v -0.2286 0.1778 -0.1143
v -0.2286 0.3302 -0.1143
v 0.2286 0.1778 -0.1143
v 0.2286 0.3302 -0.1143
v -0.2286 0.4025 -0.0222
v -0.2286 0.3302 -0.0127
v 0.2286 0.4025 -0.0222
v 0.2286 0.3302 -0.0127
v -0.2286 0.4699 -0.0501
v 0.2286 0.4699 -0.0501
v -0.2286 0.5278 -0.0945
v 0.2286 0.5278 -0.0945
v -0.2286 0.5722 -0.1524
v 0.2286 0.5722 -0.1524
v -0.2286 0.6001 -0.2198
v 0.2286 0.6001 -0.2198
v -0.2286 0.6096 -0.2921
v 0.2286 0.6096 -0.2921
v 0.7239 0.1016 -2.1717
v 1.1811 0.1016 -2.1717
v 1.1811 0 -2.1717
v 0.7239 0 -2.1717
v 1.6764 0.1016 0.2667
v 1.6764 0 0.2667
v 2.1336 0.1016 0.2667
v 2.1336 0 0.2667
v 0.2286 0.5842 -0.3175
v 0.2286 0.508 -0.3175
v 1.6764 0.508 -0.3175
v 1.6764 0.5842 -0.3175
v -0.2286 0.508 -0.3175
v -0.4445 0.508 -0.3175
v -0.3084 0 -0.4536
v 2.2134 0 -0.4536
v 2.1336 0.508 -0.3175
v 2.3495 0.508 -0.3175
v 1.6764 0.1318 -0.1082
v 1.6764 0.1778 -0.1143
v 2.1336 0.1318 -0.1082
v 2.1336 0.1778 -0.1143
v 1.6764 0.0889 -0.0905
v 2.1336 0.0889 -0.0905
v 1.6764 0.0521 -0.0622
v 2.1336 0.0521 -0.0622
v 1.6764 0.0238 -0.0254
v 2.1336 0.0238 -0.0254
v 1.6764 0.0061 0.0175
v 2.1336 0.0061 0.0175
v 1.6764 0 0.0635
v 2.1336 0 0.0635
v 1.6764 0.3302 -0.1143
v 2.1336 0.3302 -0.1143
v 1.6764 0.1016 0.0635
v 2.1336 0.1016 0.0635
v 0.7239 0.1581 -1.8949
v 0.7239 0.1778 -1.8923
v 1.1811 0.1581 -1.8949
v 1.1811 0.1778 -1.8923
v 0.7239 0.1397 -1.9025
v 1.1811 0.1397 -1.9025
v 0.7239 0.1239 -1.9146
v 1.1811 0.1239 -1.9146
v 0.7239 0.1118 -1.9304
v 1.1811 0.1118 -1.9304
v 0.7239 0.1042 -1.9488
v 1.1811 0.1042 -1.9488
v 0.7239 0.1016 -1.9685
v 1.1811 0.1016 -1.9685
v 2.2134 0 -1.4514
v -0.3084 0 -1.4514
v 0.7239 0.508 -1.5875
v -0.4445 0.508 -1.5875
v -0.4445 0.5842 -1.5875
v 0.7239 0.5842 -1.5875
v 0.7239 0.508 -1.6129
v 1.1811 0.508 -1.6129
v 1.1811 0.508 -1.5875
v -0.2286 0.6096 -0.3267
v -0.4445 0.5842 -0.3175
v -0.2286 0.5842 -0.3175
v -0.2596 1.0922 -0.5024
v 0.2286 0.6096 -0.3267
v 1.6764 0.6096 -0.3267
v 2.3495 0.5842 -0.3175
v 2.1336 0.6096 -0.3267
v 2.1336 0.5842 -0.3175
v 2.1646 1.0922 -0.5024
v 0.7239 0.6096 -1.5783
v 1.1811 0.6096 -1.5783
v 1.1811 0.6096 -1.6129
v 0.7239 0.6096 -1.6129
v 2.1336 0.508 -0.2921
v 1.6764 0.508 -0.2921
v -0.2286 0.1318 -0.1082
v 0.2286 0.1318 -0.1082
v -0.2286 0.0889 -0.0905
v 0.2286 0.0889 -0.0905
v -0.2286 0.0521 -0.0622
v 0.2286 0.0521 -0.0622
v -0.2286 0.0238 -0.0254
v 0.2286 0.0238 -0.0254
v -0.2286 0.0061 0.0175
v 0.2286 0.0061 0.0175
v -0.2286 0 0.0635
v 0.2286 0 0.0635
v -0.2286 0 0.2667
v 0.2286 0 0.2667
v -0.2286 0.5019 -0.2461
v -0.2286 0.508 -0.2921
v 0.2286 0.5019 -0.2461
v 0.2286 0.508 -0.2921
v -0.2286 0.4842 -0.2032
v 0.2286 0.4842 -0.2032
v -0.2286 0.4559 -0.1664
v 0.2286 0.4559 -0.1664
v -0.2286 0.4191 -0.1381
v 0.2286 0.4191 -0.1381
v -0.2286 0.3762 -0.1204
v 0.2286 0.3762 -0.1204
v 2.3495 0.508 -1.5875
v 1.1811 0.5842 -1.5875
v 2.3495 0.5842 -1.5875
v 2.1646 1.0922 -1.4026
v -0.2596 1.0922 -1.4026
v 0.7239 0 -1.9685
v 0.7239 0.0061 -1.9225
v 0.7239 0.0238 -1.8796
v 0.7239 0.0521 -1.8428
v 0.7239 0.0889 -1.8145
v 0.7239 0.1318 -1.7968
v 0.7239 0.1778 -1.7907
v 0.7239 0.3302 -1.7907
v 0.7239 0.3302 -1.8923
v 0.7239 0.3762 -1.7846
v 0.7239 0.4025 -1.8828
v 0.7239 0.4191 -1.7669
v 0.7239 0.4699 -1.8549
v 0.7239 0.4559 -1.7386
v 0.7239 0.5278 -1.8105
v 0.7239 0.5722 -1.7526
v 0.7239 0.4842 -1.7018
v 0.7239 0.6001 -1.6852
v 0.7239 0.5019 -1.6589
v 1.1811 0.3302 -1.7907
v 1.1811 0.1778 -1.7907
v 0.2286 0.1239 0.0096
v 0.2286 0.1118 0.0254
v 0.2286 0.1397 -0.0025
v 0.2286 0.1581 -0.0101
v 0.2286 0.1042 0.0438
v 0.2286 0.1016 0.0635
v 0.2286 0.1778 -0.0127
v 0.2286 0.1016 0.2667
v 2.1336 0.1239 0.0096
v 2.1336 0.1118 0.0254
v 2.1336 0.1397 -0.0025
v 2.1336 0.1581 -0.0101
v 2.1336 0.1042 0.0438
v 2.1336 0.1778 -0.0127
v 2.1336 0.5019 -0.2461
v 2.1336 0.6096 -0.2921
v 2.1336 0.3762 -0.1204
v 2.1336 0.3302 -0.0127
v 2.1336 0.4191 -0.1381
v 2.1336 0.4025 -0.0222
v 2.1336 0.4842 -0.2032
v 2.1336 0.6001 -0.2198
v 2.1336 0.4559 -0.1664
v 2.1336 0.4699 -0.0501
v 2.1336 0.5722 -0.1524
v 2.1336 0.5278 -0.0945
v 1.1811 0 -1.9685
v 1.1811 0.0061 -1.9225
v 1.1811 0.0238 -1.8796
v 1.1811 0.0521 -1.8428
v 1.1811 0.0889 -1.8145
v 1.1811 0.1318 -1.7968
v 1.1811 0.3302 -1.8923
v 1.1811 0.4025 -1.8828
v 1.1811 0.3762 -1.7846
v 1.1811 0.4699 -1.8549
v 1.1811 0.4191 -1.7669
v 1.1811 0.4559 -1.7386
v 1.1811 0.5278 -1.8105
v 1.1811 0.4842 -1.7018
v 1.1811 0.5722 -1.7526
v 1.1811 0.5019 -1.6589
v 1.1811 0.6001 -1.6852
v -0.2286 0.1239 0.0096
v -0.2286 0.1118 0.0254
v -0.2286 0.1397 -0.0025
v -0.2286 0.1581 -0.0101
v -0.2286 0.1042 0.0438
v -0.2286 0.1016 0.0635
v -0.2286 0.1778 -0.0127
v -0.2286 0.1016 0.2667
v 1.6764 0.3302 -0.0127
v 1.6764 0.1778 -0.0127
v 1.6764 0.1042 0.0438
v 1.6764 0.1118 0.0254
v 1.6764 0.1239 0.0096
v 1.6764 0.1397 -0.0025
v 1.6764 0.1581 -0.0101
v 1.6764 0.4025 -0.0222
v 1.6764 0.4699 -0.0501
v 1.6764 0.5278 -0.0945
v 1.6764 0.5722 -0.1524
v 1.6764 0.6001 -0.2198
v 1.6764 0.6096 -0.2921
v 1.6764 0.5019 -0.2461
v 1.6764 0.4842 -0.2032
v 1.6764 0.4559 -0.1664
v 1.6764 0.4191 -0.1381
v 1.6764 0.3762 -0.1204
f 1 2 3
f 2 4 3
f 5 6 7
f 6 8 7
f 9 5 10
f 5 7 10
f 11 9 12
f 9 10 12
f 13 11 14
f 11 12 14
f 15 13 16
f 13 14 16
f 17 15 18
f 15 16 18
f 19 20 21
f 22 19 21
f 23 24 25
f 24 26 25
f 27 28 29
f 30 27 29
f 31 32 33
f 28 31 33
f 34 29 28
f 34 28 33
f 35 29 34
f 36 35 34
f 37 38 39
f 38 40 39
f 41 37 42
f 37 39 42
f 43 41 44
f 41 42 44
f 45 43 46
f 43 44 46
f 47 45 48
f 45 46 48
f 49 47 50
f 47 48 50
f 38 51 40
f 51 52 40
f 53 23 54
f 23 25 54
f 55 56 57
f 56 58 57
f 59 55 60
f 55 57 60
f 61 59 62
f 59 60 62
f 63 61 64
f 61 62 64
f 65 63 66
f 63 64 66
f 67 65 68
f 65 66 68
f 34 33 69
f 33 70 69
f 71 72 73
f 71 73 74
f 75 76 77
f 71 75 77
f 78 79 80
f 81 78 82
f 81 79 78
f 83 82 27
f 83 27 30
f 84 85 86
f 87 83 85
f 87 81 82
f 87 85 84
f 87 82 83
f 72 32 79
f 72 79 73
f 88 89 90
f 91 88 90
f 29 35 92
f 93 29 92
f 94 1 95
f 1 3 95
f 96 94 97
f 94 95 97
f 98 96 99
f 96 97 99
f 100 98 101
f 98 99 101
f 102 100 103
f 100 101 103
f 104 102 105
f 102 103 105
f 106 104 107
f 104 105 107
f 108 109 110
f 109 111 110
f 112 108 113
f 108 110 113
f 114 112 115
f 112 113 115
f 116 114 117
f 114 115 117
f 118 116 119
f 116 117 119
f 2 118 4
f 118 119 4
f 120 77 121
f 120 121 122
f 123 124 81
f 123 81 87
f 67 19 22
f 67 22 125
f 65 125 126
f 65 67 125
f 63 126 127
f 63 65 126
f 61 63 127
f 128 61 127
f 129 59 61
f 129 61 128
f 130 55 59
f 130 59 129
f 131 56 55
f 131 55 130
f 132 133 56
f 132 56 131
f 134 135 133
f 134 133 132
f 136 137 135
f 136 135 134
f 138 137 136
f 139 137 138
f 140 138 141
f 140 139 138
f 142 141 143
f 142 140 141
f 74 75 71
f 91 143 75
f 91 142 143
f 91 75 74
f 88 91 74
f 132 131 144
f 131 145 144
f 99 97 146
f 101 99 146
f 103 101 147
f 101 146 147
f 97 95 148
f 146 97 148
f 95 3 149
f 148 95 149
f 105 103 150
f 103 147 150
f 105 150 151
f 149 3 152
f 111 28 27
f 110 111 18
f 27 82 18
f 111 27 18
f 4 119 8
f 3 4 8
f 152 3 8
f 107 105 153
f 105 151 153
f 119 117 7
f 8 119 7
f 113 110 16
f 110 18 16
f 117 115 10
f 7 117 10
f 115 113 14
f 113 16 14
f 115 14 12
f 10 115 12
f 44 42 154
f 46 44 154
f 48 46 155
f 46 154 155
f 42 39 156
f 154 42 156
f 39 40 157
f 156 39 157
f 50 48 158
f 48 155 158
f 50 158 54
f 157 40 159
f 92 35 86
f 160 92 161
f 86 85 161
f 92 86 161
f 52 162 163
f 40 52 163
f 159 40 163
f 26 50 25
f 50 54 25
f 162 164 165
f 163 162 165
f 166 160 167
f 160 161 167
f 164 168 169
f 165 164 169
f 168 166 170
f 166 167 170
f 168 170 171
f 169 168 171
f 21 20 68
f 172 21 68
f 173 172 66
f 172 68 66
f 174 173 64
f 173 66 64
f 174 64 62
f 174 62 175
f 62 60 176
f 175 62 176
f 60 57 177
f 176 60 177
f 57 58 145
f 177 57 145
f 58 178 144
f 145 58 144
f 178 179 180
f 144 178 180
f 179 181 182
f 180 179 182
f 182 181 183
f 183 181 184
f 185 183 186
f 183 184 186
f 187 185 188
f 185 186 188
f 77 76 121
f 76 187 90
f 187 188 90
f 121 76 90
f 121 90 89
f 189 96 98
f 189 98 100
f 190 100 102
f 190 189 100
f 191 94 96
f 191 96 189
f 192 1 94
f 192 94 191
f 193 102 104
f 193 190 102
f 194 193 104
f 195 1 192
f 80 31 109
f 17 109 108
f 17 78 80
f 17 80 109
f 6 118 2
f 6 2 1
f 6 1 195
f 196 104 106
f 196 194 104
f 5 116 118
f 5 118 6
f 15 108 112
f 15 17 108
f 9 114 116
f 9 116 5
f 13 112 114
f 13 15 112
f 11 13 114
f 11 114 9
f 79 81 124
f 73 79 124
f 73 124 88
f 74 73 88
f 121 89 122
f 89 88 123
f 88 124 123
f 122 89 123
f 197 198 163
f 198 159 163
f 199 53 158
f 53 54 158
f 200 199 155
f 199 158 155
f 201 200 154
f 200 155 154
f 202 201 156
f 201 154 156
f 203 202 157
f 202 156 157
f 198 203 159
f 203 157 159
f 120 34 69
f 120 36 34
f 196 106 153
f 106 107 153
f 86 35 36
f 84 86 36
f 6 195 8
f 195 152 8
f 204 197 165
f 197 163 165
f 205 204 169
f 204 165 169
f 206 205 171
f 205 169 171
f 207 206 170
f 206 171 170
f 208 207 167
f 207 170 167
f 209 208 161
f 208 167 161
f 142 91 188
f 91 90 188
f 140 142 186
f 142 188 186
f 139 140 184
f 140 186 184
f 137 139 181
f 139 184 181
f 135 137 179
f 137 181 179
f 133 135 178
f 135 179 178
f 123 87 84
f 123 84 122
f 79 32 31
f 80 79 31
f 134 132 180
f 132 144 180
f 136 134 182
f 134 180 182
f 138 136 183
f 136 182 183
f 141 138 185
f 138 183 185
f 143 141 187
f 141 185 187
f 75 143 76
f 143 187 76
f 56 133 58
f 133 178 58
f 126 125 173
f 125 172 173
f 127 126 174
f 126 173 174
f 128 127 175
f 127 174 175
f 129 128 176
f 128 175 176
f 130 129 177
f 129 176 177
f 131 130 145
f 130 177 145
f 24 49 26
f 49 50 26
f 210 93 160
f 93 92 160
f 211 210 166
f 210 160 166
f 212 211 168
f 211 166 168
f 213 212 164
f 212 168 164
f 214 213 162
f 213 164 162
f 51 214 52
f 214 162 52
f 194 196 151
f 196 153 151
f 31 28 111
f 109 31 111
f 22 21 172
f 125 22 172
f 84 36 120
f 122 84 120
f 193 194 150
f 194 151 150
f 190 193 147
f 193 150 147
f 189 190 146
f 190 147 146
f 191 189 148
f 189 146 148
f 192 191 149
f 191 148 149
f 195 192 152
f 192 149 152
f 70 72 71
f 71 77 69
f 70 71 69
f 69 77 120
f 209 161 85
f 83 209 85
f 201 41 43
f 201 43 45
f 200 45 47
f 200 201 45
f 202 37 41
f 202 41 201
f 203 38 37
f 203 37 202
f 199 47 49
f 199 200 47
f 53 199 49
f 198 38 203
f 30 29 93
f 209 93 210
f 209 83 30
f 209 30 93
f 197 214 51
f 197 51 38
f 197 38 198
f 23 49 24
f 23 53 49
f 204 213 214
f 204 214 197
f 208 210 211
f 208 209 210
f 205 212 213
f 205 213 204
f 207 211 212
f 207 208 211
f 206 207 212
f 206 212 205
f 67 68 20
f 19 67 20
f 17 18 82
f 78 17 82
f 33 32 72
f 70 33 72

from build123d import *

# Parameters (mm, degrees)
SKETCH2_W                = 2.794
SKETCH2_H                = 1.27
BASE_EXTRUDE_DEPTH       = 1.0922
CHAMFER1_SIZE2           = 0.184896879
CHAMFER1_SIZE            = 0.508
CHAMFER2_SIZE2           = 0.508
CHAMFER2_SIZE            = 0.13611819
CHAMFER2_EDGE_2_SIZE2    = 0.508
CHAMFER2_EDGE_2_SIZE     = 0.13611819
CHAMFER2_EDGE_3_SIZE2    = 0.508
CHAMFER2_EDGE_3_SIZE     = 0.13611819
CHAMFER2_EDGE_4_SIZE2    = 0.508
CHAMFER2_EDGE_4_SIZE     = 0.13611819
BOSS_EXTRUDE_THIN2_DEPTH = 0.2286
LPATTERN1_COUNT          = 2
LPATTERN1_PITCH          = 1.905
BOSS_EXTRUDE_THIN3_DEPTH = 0.2286


with BuildPart() as part:
    # Sketch2 → Base-Extrude (new body)
    with BuildSketch(Plane(origin=(0, 0, 0), x_dir=(1, 0, 0), z_dir=(0, 1, 0))):
        with Locations((0.9525, 0.9525)):
            Rectangle(SKETCH2_W, SKETCH2_H)
    extrude(amount=BASE_EXTRUDE_DEPTH)

    # Chamfer1
    chamfer1_edges = [part.edges().sort_by_distance(p)[0] for p in [
        (2.3495, 1.0922, -0.9525),
        (0.9525, 1.0922, -1.5875),
        (-0.4445, 1.0922, -0.9525),
        (0.9525, 1.0922, -0.3175),
    ]]
    chamfer(chamfer1_edges, length=CHAMFER1_SIZE, length2=CHAMFER1_SIZE2)

    # Chamfer2
    chamfer2_edges = [part.edges().sort_by_distance(p)[0] for p in [
        (0.9525, 0, -1.5875),
    ]]
    chamfer(chamfer2_edges, length=CHAMFER2_SIZE, length2=CHAMFER2_SIZE2)

    # Chamfer2 edge 2
    chamfer2_edge_2_edges = [part.edges().sort_by_distance(p)[0] for p in [
        (2.3495, 0, -0.9525),
    ]]
    chamfer(chamfer2_edge_2_edges, length=CHAMFER2_EDGE_2_SIZE, length2=CHAMFER2_EDGE_2_SIZE2)

    # Chamfer2 edge 3
    chamfer2_edge_3_edges = [part.edges().sort_by_distance(p)[0] for p in [
        (0.9525, 0, -0.3175),
    ]]
    chamfer(chamfer2_edge_3_edges, length=CHAMFER2_EDGE_3_SIZE, length2=CHAMFER2_EDGE_3_SIZE2)

    # Chamfer2 edge 4
    chamfer2_edge_4_edges = [part.edges().sort_by_distance(p)[0] for p in [
        (-0.4445, 0, -0.9525),
    ]]
    chamfer(chamfer2_edge_4_edges, length=CHAMFER2_EDGE_4_SIZE, length2=CHAMFER2_EDGE_4_SIZE2)

    # Sketch3 → Boss-Extrude-Thin2 (add, symmetric)
    with BuildSketch(Plane(origin=(0, 0, 0), x_dir=(0, 0, -1), z_dir=(1, 0, 0))):
        with BuildLine():
            Line((0.640403251, 0.508), (0.2921, 0.508))
            ThreePointArc((0.2921, 0.508), (0.166376414, 0.455923586), (0.1143, 0.3302))
            Line((0.1143, 0.3302), (0.1143, 0.1778))
            ThreePointArc((0.1143, 0.1778), (0.062223586, 0.052076414), (-0.0635, 0))
            Line((-0.0635, 0), (-0.2667, 0))
            Line((-0.2667, 0), (-0.2667, 0.1016))
            Line((-0.2667, 0.1016), (-0.0635, 0.1016))
            ThreePointArc((-0.0635, 0.1016), (-0.009618463, 0.123918463), (0.0127, 0.1778))
            Line((0.0127, 0.1778), (0.0127, 0.3302))
            ThreePointArc((0.0127, 0.3302), (0.094534365, 0.527765635), (0.2921, 0.6096))
            Line((0.2921, 0.6096), (0.640403251, 0.6096))
            Line((0.640403251, 0.6096), (0.640403251, 0.508))
        make_face()
    boss_extrude_thin2 = extrude(amount=BOSS_EXTRUDE_THIN2_DEPTH, both=True)

    # LPattern1: Boss-Extrude-Thin2 ×2
    with Locations(*[(i * LPATTERN1_PITCH, 0, 0) for i in range(1, LPATTERN1_COUNT)]):
        add(boss_extrude_thin2)

    # Sketch4 → Boss-Extrude-Thin3 (add, symmetric)
    with BuildSketch(Plane(origin=(0.9525, 0, 0), x_dir=(0, 0, -1), z_dir=(1, 0, 0))):
        with BuildLine():
            Line((2.1717, 0), (1.9685, 0))
            ThreePointArc((1.9685, 0), (1.842776414, 0.052076414), (1.7907, 0.1778))
            Line((1.7907, 0.1778), (1.7907, 0.3302))
            ThreePointArc((1.7907, 0.3302), (1.738623586, 0.455923586), (1.6129, 0.508))
            Line((1.6129, 0.508), (1.323627418, 0.508))
            Line((1.323627418, 0.508), (1.323627418, 0.6096))
            Line((1.323627418, 0.6096), (1.6129, 0.6096))
            ThreePointArc((1.6129, 0.6096), (1.810465635, 0.527765635), (1.8923, 0.3302))
            Line((1.8923, 0.3302), (1.8923, 0.1778))
            ThreePointArc((1.8923, 0.1778), (1.914618463, 0.123918463), (1.9685, 0.1016))
            Line((1.9685, 0.1016), (2.1717, 0.1016))
            Line((2.1717, 0.1016), (2.1717, 0))
        make_face()
    extrude(amount=BOSS_EXTRUDE_THIN3_DEPTH, both=True)


solid = part.part
